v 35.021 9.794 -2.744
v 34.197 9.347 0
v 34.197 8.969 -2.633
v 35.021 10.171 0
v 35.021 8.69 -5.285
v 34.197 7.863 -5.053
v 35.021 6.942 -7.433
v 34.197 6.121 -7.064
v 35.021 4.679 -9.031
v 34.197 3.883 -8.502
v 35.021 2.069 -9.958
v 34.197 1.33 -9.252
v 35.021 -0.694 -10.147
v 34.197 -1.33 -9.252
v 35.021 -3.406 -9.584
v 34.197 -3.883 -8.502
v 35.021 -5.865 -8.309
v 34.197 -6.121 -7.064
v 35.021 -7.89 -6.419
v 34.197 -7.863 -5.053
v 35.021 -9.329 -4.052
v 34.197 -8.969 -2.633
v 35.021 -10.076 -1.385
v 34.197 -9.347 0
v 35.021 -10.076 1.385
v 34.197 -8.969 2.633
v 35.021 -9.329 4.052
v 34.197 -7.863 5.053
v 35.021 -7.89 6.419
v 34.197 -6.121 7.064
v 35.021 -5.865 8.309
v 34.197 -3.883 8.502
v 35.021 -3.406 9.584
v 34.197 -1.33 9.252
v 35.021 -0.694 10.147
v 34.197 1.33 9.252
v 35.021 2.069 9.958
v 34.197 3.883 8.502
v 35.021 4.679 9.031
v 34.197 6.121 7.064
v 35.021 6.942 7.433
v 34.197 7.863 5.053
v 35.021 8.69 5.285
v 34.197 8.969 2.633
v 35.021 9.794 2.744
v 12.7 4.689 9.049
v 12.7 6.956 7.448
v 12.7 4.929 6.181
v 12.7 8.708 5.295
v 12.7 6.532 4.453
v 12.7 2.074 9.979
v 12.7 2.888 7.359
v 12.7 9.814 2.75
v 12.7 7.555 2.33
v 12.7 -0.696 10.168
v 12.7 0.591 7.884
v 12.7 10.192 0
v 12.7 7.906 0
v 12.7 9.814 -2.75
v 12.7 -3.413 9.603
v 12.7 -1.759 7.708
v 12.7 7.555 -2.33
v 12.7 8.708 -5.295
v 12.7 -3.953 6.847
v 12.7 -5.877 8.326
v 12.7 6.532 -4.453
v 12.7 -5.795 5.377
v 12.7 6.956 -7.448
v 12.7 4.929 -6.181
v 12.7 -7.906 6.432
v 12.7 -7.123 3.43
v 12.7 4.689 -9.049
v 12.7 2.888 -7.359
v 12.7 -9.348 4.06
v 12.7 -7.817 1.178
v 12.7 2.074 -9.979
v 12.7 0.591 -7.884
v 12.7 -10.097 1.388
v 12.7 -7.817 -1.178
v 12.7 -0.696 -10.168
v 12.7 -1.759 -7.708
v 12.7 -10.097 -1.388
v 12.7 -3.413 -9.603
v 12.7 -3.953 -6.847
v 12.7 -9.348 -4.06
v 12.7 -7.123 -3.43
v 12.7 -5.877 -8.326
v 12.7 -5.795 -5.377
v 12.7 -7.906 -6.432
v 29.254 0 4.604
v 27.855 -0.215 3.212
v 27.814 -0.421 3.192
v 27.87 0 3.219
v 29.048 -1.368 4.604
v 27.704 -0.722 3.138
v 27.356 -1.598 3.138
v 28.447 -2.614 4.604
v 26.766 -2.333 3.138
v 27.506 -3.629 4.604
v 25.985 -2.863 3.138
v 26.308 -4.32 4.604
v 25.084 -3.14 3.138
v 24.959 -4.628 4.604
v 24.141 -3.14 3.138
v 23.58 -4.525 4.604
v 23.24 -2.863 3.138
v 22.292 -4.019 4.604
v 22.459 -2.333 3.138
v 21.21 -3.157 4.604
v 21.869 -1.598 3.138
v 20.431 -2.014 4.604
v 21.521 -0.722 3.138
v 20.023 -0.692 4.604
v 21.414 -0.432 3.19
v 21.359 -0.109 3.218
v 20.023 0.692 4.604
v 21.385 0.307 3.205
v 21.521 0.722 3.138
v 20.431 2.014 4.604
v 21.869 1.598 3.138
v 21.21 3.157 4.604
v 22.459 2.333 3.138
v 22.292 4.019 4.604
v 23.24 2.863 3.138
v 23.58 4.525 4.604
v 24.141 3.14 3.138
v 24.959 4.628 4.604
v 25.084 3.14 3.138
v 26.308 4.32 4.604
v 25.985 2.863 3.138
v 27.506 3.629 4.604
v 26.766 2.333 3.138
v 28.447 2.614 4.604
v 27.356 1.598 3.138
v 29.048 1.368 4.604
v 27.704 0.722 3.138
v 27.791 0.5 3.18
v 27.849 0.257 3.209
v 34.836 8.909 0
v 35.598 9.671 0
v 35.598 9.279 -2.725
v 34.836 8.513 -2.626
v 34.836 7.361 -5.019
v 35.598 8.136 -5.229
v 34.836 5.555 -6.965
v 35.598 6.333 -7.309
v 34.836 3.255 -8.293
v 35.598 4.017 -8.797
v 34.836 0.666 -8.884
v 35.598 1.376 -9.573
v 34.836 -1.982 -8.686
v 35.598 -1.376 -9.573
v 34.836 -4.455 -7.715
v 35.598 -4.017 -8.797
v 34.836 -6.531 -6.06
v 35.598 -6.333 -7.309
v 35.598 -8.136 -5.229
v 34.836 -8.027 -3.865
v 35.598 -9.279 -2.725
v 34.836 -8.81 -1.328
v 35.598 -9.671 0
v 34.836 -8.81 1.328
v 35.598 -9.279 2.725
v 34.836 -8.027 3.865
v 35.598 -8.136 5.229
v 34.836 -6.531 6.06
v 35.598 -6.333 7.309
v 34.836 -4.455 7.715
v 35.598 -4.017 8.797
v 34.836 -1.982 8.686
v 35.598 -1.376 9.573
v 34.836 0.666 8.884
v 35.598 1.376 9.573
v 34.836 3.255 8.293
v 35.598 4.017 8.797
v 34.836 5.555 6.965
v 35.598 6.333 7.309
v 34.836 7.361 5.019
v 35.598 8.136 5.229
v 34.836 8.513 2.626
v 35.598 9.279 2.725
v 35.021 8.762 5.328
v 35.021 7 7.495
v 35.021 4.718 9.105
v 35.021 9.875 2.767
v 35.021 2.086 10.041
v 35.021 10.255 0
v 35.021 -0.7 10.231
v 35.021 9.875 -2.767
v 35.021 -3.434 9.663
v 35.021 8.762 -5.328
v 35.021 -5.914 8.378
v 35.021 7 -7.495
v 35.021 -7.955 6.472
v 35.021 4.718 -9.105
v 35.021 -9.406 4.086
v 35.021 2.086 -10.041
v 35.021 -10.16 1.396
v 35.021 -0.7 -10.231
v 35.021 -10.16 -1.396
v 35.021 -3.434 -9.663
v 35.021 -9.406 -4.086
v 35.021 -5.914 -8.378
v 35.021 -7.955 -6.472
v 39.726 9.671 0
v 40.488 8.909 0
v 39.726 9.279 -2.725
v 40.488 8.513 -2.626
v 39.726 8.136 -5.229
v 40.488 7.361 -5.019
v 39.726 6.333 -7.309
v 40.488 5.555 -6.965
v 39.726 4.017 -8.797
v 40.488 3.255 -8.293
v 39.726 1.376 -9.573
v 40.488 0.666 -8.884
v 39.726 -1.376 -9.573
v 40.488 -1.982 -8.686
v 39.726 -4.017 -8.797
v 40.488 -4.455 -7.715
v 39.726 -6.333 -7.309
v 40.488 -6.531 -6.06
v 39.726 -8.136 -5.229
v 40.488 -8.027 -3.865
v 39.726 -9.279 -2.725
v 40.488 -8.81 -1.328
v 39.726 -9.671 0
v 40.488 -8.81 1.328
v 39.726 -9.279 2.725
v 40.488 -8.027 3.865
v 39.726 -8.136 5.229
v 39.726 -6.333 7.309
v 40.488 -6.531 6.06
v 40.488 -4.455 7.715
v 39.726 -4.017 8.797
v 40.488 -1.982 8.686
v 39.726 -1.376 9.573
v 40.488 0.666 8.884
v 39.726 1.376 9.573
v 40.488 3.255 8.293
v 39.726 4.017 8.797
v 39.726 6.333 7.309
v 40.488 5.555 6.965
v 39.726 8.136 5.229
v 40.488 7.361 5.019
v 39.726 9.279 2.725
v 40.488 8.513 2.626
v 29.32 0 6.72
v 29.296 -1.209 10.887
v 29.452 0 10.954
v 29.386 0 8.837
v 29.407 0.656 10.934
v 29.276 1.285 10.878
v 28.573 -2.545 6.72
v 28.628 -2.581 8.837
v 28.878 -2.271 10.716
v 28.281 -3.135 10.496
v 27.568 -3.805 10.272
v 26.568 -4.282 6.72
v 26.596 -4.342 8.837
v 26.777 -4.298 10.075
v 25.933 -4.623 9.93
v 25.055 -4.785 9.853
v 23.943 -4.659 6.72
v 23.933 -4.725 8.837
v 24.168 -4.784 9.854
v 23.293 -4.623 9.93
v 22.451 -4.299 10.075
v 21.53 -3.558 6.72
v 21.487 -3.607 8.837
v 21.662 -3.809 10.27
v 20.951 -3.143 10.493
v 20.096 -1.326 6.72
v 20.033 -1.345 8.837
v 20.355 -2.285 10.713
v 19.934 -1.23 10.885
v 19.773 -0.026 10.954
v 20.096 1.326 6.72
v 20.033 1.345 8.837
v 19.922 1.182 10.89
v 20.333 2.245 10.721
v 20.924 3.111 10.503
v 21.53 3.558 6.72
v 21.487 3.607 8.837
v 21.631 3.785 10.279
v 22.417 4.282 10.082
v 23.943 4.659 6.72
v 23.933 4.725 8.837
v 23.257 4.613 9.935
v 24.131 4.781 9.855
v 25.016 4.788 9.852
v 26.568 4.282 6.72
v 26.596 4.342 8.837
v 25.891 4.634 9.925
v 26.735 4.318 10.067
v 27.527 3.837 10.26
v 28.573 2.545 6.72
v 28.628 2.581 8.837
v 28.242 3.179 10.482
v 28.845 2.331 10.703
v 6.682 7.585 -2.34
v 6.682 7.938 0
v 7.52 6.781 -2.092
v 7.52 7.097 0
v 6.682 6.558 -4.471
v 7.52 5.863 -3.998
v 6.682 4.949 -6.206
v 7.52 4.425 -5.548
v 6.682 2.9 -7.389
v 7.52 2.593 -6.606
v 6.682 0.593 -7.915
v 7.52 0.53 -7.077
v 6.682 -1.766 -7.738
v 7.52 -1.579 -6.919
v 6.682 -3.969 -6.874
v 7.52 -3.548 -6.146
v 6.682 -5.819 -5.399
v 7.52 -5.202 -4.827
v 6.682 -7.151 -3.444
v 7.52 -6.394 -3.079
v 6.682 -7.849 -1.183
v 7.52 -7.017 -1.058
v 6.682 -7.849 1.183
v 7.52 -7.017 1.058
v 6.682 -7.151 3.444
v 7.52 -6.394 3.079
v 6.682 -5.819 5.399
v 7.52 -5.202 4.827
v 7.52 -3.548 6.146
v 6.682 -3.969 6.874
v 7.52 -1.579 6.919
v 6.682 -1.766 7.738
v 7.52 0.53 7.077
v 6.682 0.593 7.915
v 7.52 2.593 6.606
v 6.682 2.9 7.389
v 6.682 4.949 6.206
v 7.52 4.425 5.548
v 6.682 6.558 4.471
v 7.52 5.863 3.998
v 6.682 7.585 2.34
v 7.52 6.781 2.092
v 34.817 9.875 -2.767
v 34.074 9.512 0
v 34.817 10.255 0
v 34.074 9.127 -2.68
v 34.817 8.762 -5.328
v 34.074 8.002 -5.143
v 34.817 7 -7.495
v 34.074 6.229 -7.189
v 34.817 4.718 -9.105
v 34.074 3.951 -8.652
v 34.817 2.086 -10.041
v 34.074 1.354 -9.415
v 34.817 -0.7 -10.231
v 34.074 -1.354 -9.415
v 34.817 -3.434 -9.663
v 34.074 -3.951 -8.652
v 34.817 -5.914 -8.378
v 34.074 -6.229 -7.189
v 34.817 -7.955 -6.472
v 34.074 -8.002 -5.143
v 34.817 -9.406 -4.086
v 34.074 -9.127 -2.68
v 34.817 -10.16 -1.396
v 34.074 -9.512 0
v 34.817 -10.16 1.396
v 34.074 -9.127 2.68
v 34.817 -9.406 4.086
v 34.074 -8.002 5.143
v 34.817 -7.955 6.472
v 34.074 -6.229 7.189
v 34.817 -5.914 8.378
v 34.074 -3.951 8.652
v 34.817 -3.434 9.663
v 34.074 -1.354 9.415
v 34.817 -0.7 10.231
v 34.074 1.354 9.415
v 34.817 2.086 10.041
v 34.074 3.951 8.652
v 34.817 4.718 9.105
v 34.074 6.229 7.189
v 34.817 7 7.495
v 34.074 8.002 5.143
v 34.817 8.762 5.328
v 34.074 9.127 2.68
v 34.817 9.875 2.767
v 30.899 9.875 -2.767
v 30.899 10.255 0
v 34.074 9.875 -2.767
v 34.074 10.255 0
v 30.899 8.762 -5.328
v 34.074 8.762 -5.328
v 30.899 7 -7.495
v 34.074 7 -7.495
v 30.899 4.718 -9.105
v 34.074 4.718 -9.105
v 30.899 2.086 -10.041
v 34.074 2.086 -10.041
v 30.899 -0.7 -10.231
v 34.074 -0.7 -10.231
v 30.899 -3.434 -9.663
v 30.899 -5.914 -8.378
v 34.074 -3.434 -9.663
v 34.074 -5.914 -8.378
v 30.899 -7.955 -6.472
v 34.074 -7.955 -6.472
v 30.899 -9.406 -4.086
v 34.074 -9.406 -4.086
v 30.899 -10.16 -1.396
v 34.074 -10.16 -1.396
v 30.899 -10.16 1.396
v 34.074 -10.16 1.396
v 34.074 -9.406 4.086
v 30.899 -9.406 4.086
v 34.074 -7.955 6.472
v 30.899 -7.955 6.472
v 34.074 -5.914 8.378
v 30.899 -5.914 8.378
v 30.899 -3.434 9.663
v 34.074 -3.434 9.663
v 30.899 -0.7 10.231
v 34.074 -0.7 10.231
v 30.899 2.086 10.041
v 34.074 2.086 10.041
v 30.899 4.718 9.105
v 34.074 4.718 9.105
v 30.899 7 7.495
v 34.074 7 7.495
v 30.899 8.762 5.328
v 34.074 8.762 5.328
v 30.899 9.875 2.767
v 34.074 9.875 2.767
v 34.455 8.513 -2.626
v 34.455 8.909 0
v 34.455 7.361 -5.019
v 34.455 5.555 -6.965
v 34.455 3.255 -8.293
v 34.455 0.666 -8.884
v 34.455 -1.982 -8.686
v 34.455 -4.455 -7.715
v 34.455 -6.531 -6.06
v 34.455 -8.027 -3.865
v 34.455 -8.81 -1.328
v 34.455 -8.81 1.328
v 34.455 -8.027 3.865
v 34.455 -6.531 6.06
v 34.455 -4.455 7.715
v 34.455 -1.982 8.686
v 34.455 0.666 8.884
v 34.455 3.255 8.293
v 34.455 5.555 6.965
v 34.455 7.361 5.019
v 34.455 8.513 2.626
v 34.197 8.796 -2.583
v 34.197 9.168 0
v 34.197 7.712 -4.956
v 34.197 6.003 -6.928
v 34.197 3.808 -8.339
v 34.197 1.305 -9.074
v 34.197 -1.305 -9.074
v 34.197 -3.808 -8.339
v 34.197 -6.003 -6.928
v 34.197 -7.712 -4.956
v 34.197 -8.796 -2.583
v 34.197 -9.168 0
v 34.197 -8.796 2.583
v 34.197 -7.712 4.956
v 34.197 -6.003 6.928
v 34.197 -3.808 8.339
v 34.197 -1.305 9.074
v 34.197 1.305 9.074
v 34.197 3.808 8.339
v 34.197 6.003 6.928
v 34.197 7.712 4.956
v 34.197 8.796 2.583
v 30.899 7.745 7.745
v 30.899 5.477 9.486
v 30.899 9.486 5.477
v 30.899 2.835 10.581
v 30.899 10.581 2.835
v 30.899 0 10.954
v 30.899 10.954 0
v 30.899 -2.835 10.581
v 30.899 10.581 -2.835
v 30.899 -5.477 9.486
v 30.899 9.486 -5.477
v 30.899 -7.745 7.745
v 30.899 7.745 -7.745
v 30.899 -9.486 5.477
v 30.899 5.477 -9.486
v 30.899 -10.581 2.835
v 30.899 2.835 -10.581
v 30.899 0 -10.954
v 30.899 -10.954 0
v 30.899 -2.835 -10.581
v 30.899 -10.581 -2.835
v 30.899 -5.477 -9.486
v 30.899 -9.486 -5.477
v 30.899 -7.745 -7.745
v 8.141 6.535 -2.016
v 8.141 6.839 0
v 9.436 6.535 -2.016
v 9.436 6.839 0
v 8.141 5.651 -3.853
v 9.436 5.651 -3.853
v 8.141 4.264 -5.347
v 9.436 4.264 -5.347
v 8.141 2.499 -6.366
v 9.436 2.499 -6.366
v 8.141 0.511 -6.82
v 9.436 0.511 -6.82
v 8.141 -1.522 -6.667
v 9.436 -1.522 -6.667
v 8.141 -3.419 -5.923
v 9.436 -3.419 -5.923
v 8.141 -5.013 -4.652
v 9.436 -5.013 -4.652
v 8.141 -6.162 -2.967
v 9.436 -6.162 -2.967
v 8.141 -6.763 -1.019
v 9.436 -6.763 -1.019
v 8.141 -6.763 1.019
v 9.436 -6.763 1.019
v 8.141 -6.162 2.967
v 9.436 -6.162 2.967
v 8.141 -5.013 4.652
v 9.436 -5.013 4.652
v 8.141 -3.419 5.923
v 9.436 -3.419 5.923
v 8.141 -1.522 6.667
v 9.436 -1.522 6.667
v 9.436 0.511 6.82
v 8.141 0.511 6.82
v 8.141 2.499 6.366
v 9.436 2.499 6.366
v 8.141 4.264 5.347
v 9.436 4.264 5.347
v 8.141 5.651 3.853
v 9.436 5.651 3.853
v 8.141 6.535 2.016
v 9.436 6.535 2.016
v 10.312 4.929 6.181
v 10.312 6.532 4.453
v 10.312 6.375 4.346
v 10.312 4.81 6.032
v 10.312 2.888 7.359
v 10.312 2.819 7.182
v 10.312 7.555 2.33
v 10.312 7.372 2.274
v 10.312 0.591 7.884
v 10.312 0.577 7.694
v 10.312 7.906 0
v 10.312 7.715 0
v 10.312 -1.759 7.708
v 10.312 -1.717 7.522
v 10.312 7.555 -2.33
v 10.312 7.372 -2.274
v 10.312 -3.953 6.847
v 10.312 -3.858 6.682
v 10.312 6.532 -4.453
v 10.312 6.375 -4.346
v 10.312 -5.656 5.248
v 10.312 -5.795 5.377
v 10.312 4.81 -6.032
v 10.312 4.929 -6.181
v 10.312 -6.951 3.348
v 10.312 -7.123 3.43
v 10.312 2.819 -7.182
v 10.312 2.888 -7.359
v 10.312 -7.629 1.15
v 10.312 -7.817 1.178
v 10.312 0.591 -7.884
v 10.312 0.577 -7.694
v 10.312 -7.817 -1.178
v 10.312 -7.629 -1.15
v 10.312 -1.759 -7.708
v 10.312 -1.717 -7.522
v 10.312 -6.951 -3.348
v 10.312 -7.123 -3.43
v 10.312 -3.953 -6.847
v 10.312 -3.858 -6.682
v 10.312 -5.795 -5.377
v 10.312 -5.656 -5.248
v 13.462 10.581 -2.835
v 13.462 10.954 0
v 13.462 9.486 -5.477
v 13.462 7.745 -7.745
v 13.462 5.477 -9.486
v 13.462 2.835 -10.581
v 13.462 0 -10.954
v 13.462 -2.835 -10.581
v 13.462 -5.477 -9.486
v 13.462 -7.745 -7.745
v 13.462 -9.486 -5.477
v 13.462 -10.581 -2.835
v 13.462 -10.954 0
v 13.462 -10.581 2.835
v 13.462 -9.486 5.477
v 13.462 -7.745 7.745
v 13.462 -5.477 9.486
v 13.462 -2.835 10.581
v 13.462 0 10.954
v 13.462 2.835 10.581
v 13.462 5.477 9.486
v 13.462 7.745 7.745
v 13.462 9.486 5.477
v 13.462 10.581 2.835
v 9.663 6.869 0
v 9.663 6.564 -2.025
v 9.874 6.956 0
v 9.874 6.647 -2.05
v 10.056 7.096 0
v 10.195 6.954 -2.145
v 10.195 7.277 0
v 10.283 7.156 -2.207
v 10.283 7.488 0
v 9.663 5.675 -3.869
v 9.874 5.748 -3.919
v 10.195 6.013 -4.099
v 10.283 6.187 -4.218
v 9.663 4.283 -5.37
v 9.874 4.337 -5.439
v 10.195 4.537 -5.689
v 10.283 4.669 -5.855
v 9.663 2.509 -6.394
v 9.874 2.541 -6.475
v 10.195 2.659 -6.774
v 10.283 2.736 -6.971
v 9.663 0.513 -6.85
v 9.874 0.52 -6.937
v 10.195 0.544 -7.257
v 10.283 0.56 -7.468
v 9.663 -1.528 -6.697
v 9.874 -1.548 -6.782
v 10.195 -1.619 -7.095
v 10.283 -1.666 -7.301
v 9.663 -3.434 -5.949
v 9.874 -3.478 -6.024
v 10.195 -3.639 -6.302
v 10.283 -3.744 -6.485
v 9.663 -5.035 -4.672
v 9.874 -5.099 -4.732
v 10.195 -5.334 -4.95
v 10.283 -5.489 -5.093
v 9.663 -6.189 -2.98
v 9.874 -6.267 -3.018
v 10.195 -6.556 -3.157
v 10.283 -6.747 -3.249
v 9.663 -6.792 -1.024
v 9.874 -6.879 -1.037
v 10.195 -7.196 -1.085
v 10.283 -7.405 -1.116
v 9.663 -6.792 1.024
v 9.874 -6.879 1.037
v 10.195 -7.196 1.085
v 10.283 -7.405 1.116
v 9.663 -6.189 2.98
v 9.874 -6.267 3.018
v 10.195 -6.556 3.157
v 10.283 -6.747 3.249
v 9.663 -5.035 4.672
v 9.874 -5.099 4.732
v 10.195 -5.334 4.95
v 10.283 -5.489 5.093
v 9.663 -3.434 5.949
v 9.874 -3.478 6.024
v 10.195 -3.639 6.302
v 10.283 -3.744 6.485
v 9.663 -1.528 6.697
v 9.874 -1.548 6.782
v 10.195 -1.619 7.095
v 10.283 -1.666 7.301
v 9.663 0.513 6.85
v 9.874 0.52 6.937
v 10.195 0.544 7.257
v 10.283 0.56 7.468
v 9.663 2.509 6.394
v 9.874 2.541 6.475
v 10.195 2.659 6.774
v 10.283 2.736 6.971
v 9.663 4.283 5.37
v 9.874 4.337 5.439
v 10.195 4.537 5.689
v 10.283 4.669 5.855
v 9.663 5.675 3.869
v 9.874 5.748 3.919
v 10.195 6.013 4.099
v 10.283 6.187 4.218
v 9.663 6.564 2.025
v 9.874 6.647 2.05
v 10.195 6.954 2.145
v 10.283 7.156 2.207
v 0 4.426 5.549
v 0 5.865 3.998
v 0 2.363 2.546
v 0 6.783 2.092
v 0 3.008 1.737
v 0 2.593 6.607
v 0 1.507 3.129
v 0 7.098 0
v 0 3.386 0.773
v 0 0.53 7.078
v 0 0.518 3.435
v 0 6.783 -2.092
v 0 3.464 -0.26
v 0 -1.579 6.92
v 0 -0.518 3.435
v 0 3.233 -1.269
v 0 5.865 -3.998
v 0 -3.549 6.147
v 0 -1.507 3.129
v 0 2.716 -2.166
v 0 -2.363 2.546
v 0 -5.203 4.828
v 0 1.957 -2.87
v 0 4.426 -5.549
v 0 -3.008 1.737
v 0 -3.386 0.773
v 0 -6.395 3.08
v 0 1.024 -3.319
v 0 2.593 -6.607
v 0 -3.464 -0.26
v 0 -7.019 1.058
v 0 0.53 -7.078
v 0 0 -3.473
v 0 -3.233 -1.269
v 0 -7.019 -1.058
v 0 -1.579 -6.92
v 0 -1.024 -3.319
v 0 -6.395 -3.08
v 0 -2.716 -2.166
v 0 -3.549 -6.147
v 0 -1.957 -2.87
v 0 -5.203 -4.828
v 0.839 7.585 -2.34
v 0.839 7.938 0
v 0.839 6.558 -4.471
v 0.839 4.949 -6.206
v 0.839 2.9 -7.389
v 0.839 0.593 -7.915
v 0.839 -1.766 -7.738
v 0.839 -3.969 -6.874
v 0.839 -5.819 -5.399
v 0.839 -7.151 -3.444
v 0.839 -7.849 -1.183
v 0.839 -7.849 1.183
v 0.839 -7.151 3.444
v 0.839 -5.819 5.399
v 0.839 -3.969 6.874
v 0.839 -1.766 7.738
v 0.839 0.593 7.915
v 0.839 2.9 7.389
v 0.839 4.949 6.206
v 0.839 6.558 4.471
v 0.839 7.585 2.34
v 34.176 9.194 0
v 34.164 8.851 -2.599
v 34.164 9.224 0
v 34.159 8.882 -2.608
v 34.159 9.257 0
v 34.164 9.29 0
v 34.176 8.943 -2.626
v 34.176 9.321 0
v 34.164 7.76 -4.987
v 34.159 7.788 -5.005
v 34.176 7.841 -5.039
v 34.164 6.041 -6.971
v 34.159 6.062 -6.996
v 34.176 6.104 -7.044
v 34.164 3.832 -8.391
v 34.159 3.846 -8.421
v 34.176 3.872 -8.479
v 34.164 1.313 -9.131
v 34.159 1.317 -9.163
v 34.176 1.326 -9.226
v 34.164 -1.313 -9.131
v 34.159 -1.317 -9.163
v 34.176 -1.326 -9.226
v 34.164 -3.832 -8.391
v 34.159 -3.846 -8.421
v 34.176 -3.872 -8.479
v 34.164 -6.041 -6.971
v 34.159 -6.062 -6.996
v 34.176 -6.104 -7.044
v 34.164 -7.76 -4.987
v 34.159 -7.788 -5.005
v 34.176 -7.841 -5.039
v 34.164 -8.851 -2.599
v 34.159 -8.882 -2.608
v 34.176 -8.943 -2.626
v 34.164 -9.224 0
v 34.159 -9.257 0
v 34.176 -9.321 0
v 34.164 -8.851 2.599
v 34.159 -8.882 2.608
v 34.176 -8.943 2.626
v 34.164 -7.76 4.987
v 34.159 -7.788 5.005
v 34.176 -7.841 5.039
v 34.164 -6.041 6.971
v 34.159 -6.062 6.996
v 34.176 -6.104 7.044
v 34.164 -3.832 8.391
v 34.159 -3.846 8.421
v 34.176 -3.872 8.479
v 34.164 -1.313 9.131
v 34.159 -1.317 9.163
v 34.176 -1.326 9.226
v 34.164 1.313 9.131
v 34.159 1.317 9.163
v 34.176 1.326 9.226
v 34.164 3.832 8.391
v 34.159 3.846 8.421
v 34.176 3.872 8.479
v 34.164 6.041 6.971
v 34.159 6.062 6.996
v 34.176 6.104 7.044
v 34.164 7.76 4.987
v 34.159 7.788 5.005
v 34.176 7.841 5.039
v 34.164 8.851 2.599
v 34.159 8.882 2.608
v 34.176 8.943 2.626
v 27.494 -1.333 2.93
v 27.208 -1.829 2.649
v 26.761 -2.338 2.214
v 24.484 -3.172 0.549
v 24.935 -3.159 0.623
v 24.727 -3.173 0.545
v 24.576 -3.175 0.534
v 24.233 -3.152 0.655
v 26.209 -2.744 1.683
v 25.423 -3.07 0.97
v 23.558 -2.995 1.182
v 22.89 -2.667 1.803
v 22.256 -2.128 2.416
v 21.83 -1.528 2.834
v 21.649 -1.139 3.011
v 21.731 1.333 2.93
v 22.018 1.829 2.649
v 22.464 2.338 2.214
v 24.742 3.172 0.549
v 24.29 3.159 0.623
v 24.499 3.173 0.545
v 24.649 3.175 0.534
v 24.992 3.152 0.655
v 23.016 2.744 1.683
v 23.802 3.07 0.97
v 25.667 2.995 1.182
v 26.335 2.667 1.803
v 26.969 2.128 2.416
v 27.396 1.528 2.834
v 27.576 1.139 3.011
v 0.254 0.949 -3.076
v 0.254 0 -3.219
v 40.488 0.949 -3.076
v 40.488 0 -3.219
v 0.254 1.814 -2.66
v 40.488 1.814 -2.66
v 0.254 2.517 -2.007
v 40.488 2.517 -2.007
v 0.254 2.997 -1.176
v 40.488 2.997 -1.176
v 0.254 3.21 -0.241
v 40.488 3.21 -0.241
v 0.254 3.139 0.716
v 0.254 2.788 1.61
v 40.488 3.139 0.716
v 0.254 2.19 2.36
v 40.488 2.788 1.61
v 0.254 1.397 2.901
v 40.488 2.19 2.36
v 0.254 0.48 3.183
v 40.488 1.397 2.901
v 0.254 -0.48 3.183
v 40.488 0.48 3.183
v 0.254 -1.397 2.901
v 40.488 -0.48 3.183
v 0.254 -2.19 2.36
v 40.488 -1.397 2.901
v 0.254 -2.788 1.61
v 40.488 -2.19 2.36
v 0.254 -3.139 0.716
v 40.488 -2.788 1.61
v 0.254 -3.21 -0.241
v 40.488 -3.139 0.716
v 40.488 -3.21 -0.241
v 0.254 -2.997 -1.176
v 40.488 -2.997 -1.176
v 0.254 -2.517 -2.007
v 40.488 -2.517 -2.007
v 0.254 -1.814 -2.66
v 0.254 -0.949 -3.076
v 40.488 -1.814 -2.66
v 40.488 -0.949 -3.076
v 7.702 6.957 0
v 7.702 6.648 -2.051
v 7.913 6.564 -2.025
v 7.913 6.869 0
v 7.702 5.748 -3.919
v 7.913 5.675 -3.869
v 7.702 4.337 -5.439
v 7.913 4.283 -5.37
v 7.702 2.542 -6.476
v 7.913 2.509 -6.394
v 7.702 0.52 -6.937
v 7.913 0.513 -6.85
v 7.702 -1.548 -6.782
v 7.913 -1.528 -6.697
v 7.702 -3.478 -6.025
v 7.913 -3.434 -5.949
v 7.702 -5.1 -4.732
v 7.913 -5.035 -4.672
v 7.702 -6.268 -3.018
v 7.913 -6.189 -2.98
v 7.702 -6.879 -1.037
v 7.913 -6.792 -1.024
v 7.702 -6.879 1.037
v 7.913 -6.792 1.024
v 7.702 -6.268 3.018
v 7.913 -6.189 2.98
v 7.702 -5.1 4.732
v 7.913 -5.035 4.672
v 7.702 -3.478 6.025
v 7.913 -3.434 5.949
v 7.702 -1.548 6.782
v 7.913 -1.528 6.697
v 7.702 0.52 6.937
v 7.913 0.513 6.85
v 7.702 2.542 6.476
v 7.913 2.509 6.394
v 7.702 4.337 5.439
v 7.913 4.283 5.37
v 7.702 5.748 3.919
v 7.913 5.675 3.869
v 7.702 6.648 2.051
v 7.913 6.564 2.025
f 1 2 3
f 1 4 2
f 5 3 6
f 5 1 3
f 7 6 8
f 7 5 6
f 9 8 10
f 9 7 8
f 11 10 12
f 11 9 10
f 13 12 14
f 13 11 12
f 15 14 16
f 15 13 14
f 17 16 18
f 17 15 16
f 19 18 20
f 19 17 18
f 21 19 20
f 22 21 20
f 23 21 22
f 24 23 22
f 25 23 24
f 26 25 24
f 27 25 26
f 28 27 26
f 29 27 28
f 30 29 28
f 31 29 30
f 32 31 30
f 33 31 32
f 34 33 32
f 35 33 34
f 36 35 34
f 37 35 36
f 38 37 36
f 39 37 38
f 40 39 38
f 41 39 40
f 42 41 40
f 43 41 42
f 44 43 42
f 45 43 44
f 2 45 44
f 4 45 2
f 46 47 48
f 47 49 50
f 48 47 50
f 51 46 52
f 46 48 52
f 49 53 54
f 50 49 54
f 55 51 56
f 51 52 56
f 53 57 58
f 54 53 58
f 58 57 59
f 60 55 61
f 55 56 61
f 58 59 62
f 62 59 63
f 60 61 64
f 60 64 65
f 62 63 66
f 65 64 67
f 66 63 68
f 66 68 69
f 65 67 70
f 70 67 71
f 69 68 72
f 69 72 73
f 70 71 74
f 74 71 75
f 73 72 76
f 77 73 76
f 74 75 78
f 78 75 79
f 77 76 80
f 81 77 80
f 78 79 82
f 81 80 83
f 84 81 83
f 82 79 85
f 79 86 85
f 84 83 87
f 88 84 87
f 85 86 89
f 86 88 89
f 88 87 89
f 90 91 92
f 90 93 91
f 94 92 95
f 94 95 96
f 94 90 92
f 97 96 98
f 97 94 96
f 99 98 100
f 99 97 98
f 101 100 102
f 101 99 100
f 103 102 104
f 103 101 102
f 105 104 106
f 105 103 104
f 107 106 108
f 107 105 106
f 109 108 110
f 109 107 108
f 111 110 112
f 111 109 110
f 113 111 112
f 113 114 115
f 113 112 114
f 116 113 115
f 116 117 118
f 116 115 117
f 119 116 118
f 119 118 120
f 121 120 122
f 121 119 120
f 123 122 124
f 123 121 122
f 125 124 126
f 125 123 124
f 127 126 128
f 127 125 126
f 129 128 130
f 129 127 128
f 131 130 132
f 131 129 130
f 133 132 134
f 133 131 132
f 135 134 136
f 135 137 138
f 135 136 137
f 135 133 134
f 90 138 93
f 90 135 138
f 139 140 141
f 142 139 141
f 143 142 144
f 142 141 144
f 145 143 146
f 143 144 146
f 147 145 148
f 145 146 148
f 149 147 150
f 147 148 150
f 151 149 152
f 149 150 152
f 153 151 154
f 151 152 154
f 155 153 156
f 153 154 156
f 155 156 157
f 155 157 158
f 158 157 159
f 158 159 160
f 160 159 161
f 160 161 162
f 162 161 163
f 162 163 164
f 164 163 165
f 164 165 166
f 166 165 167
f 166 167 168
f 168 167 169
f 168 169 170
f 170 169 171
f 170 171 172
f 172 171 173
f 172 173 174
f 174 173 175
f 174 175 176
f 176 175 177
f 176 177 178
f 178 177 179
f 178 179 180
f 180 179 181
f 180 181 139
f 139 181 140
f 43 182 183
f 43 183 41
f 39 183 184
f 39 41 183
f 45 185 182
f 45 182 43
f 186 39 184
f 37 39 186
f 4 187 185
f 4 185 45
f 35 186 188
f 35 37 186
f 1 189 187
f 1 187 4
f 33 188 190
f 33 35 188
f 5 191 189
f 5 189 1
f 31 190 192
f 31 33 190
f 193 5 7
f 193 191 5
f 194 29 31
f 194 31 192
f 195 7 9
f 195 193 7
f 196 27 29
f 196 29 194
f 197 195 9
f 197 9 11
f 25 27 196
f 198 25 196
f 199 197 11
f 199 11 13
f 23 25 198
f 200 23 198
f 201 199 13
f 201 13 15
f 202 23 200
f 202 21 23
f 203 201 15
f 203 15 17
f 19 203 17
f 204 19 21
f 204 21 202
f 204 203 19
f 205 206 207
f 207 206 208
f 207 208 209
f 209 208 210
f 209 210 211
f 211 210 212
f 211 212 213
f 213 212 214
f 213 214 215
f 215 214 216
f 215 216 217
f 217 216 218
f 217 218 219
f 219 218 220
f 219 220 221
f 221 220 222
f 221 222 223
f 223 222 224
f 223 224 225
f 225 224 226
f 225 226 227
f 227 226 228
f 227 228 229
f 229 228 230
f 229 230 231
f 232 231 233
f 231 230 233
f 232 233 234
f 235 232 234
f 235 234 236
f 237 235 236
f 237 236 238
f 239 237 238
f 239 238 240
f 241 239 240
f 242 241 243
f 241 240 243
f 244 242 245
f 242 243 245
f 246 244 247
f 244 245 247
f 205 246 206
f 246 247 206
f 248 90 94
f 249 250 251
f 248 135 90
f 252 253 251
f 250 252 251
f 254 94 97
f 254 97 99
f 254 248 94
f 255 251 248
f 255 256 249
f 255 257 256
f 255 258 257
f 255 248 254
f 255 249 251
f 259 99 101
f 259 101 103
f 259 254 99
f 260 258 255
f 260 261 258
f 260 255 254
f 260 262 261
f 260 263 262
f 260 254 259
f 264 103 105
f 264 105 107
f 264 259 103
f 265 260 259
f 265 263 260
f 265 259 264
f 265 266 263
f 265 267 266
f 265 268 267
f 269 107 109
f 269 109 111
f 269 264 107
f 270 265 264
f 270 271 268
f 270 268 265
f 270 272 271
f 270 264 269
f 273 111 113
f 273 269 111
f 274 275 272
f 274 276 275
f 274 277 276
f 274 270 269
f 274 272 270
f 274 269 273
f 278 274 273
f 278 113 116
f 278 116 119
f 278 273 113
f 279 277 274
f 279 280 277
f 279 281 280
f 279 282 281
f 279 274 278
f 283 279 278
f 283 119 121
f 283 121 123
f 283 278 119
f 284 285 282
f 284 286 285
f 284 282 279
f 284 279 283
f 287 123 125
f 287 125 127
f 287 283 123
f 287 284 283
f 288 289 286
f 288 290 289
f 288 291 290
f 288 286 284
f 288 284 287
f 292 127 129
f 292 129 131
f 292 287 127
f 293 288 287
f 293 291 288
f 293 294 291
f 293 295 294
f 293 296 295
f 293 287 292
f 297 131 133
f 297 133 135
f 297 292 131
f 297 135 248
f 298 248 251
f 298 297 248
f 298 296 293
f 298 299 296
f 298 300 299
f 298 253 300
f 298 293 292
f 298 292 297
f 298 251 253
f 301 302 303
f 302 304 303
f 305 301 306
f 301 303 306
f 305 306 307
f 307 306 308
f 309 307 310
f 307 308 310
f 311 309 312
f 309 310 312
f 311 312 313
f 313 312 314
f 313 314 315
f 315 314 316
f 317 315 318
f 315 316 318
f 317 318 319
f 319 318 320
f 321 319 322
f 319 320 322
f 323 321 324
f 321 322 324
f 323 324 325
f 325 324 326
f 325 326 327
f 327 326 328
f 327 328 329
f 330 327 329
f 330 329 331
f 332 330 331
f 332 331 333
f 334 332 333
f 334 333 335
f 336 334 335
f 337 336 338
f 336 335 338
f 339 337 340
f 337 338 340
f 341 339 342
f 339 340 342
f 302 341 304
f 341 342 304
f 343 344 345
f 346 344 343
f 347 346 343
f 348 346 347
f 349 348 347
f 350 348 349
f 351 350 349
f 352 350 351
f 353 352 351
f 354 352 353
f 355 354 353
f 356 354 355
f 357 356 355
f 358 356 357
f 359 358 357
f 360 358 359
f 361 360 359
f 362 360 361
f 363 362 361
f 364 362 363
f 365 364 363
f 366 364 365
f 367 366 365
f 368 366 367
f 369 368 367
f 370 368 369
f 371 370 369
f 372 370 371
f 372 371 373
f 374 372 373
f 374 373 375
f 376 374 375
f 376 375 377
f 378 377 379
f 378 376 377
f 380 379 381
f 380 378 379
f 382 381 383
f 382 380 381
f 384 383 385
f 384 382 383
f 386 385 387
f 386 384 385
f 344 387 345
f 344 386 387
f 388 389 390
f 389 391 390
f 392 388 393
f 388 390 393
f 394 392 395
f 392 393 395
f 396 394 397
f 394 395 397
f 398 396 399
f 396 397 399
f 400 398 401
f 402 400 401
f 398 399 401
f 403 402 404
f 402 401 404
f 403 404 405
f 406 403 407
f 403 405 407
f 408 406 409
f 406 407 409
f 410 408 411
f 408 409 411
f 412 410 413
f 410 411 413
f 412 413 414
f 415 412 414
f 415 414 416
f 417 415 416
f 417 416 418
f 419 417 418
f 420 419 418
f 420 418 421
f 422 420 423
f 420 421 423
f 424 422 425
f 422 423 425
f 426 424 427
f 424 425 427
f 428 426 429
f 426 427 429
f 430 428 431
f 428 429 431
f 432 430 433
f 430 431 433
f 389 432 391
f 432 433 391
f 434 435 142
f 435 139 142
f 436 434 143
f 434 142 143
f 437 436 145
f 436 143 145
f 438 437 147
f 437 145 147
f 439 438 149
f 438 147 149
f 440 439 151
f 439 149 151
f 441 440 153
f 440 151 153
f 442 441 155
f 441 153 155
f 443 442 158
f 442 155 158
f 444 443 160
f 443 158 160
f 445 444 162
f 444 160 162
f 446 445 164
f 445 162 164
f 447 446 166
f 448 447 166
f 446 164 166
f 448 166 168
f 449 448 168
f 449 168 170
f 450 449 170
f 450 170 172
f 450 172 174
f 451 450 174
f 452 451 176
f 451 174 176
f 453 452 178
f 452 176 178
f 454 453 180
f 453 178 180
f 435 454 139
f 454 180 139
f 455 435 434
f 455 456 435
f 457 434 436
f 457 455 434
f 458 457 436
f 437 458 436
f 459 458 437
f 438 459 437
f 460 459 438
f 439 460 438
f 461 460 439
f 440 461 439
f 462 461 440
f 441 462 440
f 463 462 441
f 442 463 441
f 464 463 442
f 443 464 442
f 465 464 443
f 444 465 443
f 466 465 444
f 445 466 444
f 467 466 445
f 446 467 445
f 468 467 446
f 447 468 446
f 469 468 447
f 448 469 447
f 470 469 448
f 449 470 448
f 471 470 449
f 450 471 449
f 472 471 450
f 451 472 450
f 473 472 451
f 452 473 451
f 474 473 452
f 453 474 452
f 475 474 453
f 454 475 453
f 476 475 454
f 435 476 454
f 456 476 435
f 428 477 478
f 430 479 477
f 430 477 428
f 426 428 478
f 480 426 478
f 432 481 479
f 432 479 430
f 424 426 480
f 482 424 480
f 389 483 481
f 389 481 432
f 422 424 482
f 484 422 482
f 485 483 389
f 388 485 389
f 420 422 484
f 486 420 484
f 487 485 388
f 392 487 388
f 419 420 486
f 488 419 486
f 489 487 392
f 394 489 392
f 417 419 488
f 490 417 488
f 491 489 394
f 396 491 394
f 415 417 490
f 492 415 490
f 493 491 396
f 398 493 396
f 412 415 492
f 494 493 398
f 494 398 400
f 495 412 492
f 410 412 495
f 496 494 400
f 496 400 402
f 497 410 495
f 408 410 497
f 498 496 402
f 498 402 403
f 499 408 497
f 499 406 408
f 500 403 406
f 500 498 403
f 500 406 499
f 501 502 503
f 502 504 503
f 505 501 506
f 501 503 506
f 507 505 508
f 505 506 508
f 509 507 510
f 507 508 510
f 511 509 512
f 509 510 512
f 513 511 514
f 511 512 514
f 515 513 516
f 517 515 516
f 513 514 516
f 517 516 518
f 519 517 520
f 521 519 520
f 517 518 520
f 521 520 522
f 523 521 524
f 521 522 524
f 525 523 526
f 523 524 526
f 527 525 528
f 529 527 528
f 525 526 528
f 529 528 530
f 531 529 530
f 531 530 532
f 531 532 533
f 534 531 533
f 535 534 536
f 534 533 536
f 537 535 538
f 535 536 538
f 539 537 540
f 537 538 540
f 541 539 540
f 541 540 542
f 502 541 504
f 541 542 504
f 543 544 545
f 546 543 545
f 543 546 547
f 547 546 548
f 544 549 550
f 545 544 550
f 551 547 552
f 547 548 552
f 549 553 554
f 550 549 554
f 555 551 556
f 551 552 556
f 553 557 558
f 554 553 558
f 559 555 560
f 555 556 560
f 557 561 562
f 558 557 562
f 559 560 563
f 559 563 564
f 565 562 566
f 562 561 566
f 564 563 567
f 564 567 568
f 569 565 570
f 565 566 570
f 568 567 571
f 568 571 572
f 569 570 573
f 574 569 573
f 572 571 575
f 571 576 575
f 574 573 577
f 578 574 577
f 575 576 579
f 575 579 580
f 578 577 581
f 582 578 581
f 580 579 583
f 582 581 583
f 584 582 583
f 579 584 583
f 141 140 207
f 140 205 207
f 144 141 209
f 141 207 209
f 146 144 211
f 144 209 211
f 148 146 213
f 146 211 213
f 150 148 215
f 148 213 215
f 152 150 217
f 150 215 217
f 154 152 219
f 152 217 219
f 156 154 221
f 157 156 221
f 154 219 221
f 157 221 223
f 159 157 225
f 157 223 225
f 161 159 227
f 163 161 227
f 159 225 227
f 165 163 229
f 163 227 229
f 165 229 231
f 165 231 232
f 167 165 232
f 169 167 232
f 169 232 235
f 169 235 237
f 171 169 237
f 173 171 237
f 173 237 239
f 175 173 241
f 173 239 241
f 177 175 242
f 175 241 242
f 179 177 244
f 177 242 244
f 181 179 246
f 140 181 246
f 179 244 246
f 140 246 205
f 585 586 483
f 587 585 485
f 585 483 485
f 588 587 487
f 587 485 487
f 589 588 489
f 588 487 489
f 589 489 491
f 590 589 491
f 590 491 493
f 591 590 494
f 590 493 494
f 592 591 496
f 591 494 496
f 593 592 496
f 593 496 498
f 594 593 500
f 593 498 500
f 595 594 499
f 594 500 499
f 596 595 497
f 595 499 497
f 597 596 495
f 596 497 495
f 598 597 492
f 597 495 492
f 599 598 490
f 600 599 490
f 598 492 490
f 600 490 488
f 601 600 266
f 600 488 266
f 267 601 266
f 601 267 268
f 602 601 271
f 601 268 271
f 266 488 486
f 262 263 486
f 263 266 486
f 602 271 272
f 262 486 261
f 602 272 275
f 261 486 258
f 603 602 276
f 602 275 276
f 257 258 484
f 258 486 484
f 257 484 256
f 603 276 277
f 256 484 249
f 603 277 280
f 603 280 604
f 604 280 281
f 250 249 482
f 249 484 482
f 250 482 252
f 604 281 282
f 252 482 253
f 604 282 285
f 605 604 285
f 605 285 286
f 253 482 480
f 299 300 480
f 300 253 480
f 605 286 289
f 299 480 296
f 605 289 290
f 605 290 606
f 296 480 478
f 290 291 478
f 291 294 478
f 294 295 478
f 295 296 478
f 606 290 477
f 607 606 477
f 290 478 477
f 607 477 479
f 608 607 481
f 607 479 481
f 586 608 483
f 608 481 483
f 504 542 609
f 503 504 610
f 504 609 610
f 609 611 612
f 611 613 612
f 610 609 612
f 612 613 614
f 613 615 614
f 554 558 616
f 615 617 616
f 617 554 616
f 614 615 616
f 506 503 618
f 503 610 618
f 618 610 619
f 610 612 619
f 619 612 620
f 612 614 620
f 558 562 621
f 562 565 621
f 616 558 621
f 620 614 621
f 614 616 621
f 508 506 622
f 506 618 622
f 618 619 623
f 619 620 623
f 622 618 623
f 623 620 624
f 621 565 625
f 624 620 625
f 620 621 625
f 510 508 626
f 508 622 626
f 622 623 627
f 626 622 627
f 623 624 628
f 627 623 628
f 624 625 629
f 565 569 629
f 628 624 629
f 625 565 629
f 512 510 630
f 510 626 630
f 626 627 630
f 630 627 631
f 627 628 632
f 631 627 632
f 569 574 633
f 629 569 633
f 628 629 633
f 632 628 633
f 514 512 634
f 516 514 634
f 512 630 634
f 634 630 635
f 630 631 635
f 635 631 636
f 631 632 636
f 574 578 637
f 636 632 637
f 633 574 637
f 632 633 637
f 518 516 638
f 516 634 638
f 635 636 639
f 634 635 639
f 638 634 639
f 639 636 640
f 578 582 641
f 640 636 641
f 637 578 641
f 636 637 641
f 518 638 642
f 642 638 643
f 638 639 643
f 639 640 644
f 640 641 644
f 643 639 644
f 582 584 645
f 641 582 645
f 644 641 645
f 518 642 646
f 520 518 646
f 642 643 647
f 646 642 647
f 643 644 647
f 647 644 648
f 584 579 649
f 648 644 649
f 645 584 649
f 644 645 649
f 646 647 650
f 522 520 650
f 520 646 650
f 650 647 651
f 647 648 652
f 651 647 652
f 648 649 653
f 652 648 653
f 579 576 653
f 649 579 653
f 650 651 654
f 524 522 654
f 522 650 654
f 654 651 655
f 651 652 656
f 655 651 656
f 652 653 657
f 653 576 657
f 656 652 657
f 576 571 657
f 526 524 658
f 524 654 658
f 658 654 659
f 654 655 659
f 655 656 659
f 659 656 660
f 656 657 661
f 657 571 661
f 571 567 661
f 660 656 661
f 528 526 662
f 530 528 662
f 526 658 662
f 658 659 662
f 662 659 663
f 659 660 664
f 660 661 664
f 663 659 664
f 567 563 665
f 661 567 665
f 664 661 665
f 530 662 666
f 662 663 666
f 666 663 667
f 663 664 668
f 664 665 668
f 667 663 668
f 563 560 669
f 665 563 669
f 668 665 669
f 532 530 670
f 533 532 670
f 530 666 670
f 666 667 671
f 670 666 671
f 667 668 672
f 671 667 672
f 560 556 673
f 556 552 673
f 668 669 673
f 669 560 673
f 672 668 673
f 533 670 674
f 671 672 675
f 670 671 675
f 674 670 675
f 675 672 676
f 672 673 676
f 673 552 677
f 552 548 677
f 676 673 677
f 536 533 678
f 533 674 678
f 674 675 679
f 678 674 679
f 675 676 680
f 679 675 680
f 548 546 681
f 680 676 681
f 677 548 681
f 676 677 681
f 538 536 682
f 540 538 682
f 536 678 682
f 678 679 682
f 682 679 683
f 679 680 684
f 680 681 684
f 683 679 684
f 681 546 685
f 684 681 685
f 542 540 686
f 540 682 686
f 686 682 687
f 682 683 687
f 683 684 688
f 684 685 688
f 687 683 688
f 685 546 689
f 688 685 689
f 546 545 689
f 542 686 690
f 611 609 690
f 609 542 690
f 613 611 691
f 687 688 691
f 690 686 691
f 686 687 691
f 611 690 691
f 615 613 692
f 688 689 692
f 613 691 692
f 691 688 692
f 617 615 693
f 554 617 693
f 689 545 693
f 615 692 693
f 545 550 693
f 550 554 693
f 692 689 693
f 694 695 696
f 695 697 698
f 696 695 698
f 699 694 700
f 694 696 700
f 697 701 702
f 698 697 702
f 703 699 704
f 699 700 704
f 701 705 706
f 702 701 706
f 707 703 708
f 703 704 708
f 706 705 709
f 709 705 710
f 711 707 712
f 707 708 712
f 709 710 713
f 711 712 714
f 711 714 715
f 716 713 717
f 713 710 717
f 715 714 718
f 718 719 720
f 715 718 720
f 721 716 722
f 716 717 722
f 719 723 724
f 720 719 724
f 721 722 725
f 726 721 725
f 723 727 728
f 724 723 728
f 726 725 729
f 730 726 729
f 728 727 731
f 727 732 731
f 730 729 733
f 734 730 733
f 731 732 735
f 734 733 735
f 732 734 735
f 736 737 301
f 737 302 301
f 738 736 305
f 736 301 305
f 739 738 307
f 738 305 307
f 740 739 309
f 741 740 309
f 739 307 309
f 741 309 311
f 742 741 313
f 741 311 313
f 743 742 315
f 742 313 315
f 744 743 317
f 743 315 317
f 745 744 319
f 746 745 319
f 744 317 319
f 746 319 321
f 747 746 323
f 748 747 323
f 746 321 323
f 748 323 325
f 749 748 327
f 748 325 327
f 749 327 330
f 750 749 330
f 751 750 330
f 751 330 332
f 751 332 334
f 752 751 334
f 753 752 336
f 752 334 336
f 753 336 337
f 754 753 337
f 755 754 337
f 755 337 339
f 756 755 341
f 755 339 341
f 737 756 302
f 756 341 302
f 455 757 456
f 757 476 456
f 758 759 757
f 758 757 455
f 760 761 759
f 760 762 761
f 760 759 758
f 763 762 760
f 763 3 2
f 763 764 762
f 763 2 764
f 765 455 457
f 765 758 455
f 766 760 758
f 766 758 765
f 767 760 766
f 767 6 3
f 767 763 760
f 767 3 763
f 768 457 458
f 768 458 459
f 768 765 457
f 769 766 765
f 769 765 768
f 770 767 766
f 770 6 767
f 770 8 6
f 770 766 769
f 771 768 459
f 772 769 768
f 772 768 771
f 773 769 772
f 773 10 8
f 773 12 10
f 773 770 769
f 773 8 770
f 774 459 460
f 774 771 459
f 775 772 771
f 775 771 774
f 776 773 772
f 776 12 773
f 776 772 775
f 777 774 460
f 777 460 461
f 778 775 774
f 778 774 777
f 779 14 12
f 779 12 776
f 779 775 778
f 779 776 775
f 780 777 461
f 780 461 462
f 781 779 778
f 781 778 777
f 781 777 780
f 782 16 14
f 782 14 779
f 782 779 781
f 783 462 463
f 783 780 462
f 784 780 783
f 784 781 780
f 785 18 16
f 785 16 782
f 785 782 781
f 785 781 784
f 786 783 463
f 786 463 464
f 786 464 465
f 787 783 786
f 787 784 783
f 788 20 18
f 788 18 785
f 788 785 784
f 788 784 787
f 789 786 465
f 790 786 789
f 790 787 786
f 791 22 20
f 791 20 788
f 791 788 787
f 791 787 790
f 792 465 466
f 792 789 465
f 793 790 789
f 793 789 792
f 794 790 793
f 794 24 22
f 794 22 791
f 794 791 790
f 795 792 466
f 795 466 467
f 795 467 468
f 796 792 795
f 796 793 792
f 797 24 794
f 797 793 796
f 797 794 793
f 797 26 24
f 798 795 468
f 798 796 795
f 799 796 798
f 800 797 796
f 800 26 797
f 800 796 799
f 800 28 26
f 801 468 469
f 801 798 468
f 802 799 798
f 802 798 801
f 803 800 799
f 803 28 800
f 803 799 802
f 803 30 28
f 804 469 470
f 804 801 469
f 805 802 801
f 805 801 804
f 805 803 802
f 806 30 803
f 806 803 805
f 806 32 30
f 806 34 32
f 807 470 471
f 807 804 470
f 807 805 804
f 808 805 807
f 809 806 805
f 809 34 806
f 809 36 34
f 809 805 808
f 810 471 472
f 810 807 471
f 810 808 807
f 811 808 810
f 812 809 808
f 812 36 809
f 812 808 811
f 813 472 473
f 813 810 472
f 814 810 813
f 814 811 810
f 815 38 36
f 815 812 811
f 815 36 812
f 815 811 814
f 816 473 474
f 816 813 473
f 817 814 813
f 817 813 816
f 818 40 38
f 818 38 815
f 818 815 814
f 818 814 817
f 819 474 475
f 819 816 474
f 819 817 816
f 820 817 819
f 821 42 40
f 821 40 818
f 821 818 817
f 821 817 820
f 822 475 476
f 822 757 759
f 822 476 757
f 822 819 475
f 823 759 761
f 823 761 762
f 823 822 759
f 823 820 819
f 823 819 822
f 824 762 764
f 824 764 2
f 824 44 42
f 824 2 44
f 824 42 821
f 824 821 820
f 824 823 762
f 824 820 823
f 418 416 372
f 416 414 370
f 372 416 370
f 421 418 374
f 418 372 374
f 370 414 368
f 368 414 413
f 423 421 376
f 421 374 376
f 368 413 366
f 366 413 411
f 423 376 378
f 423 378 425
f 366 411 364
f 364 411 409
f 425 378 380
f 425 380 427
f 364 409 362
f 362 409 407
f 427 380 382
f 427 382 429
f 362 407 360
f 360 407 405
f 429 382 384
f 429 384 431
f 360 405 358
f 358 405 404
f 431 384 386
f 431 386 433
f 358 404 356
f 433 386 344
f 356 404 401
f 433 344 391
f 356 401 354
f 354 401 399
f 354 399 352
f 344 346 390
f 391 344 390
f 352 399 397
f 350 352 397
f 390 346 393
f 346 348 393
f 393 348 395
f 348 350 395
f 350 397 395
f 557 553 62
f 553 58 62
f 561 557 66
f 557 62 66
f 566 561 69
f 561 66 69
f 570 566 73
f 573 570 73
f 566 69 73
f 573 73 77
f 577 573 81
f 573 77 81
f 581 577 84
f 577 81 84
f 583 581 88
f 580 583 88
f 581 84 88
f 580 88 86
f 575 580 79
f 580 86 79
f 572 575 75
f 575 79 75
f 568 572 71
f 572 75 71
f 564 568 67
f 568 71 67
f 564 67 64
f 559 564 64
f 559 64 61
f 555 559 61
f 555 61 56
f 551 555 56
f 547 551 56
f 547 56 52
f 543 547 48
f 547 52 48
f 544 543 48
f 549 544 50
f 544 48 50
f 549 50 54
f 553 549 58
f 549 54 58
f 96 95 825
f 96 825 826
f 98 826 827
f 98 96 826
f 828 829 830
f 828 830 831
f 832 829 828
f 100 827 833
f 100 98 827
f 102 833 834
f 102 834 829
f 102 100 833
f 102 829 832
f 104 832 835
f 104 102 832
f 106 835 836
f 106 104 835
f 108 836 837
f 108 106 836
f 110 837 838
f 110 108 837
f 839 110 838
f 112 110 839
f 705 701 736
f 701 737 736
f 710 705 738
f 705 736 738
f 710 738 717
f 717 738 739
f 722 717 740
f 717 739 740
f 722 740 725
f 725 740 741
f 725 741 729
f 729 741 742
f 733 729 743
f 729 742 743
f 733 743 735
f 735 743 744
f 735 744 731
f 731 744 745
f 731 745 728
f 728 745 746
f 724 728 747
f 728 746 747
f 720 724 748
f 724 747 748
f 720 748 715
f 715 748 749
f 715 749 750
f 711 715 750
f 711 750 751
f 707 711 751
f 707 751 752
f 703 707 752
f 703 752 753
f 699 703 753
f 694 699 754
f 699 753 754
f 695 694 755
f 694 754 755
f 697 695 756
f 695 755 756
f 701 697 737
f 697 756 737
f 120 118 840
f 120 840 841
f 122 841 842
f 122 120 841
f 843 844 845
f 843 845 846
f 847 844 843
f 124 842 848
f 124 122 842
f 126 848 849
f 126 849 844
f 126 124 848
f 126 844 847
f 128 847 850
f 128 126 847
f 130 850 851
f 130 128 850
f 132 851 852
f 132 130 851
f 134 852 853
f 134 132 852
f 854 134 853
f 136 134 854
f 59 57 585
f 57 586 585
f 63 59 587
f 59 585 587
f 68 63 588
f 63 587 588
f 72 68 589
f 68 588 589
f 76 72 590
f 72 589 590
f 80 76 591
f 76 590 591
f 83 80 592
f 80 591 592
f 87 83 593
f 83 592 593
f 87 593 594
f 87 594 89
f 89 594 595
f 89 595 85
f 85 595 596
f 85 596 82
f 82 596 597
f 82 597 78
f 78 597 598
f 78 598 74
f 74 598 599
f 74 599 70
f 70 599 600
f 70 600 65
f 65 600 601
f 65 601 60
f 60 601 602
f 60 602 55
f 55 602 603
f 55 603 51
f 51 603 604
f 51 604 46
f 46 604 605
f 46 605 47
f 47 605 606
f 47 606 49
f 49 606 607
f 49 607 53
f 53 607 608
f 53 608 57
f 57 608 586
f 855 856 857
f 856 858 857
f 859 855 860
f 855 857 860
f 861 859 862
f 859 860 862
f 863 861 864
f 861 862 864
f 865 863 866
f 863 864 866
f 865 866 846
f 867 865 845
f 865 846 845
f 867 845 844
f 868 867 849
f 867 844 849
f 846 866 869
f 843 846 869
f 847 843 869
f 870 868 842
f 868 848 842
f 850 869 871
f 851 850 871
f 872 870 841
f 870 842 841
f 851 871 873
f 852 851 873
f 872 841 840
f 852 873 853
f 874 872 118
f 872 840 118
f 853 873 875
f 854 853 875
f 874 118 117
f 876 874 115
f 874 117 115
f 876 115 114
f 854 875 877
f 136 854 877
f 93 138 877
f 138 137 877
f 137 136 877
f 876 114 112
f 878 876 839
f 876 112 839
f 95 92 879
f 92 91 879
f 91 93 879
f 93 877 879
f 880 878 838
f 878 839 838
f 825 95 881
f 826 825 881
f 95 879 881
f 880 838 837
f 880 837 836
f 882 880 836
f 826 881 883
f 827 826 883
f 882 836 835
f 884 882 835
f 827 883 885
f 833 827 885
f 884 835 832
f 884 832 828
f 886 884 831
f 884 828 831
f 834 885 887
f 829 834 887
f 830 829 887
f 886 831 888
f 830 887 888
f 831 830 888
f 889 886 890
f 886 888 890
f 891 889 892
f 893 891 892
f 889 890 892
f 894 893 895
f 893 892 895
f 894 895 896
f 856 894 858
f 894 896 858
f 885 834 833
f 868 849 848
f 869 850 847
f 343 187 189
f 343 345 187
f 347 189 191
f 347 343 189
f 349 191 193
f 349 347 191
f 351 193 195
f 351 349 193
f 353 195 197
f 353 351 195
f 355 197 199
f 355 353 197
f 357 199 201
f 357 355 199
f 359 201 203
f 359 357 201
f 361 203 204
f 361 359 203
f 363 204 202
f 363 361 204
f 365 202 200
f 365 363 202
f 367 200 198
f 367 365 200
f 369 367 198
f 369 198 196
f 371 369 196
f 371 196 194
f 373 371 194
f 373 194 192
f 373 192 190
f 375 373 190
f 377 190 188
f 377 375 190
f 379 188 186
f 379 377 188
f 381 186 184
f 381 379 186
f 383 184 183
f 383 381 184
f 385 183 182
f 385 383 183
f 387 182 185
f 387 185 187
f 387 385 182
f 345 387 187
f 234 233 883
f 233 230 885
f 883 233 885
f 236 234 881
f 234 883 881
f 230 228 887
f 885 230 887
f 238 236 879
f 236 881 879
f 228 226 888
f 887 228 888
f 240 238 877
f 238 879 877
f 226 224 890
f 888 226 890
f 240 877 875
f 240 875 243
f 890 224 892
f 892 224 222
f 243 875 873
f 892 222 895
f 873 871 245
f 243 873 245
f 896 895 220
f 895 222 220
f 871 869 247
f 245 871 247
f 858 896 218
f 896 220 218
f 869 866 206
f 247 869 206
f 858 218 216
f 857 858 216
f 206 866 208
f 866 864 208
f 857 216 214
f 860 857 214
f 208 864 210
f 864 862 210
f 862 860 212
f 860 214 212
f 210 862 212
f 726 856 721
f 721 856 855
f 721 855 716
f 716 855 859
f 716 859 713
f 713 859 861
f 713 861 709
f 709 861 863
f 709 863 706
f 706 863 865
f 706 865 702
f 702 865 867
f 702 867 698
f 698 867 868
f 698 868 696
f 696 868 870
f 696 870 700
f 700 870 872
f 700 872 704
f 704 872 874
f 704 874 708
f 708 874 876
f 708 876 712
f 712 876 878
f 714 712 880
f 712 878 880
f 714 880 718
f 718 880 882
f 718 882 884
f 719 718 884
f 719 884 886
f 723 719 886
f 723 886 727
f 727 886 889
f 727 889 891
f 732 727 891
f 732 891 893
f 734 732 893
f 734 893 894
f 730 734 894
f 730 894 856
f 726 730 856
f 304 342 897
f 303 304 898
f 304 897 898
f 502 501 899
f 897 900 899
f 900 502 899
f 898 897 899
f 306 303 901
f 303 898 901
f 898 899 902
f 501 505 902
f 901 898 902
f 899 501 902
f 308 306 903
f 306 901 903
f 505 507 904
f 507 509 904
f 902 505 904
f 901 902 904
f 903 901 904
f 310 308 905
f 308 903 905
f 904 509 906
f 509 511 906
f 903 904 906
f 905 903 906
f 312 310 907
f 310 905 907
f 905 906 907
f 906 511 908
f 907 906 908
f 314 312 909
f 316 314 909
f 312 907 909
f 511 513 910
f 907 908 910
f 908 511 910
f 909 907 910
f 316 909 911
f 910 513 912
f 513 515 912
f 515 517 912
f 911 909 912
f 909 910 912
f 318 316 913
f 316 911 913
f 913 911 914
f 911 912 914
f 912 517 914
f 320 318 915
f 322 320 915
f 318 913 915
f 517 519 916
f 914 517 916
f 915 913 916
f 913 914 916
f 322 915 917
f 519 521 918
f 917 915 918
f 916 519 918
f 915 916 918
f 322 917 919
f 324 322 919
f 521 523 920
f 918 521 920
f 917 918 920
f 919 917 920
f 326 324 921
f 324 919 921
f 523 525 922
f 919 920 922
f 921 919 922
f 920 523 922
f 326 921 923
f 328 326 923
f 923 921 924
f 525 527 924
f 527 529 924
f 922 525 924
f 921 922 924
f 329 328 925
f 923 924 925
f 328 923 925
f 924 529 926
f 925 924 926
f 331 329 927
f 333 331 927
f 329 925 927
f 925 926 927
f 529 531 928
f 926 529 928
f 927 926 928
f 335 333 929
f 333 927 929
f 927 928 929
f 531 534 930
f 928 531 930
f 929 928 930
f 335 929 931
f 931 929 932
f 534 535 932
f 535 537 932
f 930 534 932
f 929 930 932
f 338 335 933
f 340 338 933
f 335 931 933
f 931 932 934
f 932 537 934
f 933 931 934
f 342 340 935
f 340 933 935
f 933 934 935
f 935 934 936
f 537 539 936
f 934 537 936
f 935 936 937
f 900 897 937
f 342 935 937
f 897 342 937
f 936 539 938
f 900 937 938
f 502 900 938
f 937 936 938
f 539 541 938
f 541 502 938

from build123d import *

# Parameters (mm, degrees)
HOLE1_D           = 6.4389
HOLE1_CSINK_D     = 6.9469
HOLE1_CSINK_ANGLE = 90
SKETCH5_W         = 3.175
SKETCH5_H         = 5.08


with BuildPart() as part:
    # Sketch1 → Revolve1 (revolve)
    with BuildSketch(Plane.XY):
        with BuildLine():
            Line((0, 0), (0, 7.09803))
            Line((0, 7.09803), (0.83947, 7.9375))
            Line((0.83947, 7.9375), (6.681592328, 7.9375))
            Line((6.681592328, 7.9375), (7.520171502, 7.096504435))
            ThreePointArc((7.520171502, 7.096504435), (7.804772216, 6.905895804), (8.1407, 6.83895))
            Line((8.1407, 6.83895), (9.4361, 6.83895))
            ThreePointArc((9.4361, 6.83895), (10.055737672, 7.095612328), (10.3124, 7.71525))
            Line((10.3124, 7.71525), (10.3124, 7.90575))
            Line((10.3124, 7.90575), (12.7, 7.90575))
            Line((12.7, 7.90575), (12.7, 0))
            Line((12.7, 0), (0, 0))
        make_face()
    revolve(axis=Axis((12.7, 0, 0), (-1, 0, 0)))

    # Sketch2 → Revolve2 (revolve)
    with BuildSketch(Plane.XY):
        Polygon((12.7, 0), (12.7, 10.19175), (13.462, 10.95375), (34.0741, 10.95375), (34.0741, 8.90905), (34.8361, 8.90905), (35.5981, 9.67105), (39.7256, 9.67105), (40.4876, 8.90905), (40.4876, 0), align=None)
    revolve(axis=Axis((40.4876, 0, 0), (-1, 0, 0)))

    # Hole1 (through all)
    with Locations(Plane.ZY):
        with Locations((0, 0)):
            CounterSinkHole(HOLE1_D / 2, HOLE1_CSINK_D / 2, counter_sink_angle=HOLE1_CSINK_ANGLE)

    # Sketch5 → Cut-Revolve1 (revolve, cut)
    with BuildSketch(Plane.XY):
        with Locations((32.4866, 12.79525)):
            Rectangle(SKETCH5_W, SKETCH5_H)
    revolve(axis=Axis((34.0741, 0, 0), (-1, 0, 0)), mode=Mode.SUBTRACT)

    # Sketch6 → Cut-Revolve2 (revolve, cut)
    with BuildSketch(Plane(origin=(0, 0, 0), x_dir=(1, 0, 0), z_dir=(0, 1, 0))):
        Polygon((24.6126, 0), (27.7876, 0), (27.7876, -3.137518166), (29.253831834, -4.60375), (29.452075925, -10.95375), (24.6126, -10.95375), align=None)
    revolve(axis=Axis((24.6126, 0, 10.95375), (0, 0, -1)), mode=Mode.SUBTRACT)

    # Sketch7 → Revolve3 (revolve)
    with BuildSketch(Plane.XY):
        with BuildLine():
            Line((34.0741, 8.65505), (34.8361, 8.65505))
            Line((34.8361, 8.65505), (34.8361, 8.90905))
            Line((34.8361, 8.90905), (34.4551, 8.90905))
            Line((34.4551, 8.90905), (34.196587194, 9.167562806))
            ThreePointArc((34.196587194, 9.167562806), (34.159389755, 9.257365367), (34.196587194, 9.347167928))
            Line((34.196587194, 9.347167928), (35.02050107, 10.171081804))
            Line((35.02050107, 10.171081804), (35.02050107, 10.25525))
            Line((35.02050107, 10.25525), (34.81730107, 10.25525))
            Line((34.81730107, 10.25525), (34.0741, 9.51204893))
            Line((34.0741, 9.51204893), (34.0741, 8.65505))
        make_face()
    revolve(axis=Axis((34.8361, 0, 0), (-1, 0, 0)))


solid = part.part
